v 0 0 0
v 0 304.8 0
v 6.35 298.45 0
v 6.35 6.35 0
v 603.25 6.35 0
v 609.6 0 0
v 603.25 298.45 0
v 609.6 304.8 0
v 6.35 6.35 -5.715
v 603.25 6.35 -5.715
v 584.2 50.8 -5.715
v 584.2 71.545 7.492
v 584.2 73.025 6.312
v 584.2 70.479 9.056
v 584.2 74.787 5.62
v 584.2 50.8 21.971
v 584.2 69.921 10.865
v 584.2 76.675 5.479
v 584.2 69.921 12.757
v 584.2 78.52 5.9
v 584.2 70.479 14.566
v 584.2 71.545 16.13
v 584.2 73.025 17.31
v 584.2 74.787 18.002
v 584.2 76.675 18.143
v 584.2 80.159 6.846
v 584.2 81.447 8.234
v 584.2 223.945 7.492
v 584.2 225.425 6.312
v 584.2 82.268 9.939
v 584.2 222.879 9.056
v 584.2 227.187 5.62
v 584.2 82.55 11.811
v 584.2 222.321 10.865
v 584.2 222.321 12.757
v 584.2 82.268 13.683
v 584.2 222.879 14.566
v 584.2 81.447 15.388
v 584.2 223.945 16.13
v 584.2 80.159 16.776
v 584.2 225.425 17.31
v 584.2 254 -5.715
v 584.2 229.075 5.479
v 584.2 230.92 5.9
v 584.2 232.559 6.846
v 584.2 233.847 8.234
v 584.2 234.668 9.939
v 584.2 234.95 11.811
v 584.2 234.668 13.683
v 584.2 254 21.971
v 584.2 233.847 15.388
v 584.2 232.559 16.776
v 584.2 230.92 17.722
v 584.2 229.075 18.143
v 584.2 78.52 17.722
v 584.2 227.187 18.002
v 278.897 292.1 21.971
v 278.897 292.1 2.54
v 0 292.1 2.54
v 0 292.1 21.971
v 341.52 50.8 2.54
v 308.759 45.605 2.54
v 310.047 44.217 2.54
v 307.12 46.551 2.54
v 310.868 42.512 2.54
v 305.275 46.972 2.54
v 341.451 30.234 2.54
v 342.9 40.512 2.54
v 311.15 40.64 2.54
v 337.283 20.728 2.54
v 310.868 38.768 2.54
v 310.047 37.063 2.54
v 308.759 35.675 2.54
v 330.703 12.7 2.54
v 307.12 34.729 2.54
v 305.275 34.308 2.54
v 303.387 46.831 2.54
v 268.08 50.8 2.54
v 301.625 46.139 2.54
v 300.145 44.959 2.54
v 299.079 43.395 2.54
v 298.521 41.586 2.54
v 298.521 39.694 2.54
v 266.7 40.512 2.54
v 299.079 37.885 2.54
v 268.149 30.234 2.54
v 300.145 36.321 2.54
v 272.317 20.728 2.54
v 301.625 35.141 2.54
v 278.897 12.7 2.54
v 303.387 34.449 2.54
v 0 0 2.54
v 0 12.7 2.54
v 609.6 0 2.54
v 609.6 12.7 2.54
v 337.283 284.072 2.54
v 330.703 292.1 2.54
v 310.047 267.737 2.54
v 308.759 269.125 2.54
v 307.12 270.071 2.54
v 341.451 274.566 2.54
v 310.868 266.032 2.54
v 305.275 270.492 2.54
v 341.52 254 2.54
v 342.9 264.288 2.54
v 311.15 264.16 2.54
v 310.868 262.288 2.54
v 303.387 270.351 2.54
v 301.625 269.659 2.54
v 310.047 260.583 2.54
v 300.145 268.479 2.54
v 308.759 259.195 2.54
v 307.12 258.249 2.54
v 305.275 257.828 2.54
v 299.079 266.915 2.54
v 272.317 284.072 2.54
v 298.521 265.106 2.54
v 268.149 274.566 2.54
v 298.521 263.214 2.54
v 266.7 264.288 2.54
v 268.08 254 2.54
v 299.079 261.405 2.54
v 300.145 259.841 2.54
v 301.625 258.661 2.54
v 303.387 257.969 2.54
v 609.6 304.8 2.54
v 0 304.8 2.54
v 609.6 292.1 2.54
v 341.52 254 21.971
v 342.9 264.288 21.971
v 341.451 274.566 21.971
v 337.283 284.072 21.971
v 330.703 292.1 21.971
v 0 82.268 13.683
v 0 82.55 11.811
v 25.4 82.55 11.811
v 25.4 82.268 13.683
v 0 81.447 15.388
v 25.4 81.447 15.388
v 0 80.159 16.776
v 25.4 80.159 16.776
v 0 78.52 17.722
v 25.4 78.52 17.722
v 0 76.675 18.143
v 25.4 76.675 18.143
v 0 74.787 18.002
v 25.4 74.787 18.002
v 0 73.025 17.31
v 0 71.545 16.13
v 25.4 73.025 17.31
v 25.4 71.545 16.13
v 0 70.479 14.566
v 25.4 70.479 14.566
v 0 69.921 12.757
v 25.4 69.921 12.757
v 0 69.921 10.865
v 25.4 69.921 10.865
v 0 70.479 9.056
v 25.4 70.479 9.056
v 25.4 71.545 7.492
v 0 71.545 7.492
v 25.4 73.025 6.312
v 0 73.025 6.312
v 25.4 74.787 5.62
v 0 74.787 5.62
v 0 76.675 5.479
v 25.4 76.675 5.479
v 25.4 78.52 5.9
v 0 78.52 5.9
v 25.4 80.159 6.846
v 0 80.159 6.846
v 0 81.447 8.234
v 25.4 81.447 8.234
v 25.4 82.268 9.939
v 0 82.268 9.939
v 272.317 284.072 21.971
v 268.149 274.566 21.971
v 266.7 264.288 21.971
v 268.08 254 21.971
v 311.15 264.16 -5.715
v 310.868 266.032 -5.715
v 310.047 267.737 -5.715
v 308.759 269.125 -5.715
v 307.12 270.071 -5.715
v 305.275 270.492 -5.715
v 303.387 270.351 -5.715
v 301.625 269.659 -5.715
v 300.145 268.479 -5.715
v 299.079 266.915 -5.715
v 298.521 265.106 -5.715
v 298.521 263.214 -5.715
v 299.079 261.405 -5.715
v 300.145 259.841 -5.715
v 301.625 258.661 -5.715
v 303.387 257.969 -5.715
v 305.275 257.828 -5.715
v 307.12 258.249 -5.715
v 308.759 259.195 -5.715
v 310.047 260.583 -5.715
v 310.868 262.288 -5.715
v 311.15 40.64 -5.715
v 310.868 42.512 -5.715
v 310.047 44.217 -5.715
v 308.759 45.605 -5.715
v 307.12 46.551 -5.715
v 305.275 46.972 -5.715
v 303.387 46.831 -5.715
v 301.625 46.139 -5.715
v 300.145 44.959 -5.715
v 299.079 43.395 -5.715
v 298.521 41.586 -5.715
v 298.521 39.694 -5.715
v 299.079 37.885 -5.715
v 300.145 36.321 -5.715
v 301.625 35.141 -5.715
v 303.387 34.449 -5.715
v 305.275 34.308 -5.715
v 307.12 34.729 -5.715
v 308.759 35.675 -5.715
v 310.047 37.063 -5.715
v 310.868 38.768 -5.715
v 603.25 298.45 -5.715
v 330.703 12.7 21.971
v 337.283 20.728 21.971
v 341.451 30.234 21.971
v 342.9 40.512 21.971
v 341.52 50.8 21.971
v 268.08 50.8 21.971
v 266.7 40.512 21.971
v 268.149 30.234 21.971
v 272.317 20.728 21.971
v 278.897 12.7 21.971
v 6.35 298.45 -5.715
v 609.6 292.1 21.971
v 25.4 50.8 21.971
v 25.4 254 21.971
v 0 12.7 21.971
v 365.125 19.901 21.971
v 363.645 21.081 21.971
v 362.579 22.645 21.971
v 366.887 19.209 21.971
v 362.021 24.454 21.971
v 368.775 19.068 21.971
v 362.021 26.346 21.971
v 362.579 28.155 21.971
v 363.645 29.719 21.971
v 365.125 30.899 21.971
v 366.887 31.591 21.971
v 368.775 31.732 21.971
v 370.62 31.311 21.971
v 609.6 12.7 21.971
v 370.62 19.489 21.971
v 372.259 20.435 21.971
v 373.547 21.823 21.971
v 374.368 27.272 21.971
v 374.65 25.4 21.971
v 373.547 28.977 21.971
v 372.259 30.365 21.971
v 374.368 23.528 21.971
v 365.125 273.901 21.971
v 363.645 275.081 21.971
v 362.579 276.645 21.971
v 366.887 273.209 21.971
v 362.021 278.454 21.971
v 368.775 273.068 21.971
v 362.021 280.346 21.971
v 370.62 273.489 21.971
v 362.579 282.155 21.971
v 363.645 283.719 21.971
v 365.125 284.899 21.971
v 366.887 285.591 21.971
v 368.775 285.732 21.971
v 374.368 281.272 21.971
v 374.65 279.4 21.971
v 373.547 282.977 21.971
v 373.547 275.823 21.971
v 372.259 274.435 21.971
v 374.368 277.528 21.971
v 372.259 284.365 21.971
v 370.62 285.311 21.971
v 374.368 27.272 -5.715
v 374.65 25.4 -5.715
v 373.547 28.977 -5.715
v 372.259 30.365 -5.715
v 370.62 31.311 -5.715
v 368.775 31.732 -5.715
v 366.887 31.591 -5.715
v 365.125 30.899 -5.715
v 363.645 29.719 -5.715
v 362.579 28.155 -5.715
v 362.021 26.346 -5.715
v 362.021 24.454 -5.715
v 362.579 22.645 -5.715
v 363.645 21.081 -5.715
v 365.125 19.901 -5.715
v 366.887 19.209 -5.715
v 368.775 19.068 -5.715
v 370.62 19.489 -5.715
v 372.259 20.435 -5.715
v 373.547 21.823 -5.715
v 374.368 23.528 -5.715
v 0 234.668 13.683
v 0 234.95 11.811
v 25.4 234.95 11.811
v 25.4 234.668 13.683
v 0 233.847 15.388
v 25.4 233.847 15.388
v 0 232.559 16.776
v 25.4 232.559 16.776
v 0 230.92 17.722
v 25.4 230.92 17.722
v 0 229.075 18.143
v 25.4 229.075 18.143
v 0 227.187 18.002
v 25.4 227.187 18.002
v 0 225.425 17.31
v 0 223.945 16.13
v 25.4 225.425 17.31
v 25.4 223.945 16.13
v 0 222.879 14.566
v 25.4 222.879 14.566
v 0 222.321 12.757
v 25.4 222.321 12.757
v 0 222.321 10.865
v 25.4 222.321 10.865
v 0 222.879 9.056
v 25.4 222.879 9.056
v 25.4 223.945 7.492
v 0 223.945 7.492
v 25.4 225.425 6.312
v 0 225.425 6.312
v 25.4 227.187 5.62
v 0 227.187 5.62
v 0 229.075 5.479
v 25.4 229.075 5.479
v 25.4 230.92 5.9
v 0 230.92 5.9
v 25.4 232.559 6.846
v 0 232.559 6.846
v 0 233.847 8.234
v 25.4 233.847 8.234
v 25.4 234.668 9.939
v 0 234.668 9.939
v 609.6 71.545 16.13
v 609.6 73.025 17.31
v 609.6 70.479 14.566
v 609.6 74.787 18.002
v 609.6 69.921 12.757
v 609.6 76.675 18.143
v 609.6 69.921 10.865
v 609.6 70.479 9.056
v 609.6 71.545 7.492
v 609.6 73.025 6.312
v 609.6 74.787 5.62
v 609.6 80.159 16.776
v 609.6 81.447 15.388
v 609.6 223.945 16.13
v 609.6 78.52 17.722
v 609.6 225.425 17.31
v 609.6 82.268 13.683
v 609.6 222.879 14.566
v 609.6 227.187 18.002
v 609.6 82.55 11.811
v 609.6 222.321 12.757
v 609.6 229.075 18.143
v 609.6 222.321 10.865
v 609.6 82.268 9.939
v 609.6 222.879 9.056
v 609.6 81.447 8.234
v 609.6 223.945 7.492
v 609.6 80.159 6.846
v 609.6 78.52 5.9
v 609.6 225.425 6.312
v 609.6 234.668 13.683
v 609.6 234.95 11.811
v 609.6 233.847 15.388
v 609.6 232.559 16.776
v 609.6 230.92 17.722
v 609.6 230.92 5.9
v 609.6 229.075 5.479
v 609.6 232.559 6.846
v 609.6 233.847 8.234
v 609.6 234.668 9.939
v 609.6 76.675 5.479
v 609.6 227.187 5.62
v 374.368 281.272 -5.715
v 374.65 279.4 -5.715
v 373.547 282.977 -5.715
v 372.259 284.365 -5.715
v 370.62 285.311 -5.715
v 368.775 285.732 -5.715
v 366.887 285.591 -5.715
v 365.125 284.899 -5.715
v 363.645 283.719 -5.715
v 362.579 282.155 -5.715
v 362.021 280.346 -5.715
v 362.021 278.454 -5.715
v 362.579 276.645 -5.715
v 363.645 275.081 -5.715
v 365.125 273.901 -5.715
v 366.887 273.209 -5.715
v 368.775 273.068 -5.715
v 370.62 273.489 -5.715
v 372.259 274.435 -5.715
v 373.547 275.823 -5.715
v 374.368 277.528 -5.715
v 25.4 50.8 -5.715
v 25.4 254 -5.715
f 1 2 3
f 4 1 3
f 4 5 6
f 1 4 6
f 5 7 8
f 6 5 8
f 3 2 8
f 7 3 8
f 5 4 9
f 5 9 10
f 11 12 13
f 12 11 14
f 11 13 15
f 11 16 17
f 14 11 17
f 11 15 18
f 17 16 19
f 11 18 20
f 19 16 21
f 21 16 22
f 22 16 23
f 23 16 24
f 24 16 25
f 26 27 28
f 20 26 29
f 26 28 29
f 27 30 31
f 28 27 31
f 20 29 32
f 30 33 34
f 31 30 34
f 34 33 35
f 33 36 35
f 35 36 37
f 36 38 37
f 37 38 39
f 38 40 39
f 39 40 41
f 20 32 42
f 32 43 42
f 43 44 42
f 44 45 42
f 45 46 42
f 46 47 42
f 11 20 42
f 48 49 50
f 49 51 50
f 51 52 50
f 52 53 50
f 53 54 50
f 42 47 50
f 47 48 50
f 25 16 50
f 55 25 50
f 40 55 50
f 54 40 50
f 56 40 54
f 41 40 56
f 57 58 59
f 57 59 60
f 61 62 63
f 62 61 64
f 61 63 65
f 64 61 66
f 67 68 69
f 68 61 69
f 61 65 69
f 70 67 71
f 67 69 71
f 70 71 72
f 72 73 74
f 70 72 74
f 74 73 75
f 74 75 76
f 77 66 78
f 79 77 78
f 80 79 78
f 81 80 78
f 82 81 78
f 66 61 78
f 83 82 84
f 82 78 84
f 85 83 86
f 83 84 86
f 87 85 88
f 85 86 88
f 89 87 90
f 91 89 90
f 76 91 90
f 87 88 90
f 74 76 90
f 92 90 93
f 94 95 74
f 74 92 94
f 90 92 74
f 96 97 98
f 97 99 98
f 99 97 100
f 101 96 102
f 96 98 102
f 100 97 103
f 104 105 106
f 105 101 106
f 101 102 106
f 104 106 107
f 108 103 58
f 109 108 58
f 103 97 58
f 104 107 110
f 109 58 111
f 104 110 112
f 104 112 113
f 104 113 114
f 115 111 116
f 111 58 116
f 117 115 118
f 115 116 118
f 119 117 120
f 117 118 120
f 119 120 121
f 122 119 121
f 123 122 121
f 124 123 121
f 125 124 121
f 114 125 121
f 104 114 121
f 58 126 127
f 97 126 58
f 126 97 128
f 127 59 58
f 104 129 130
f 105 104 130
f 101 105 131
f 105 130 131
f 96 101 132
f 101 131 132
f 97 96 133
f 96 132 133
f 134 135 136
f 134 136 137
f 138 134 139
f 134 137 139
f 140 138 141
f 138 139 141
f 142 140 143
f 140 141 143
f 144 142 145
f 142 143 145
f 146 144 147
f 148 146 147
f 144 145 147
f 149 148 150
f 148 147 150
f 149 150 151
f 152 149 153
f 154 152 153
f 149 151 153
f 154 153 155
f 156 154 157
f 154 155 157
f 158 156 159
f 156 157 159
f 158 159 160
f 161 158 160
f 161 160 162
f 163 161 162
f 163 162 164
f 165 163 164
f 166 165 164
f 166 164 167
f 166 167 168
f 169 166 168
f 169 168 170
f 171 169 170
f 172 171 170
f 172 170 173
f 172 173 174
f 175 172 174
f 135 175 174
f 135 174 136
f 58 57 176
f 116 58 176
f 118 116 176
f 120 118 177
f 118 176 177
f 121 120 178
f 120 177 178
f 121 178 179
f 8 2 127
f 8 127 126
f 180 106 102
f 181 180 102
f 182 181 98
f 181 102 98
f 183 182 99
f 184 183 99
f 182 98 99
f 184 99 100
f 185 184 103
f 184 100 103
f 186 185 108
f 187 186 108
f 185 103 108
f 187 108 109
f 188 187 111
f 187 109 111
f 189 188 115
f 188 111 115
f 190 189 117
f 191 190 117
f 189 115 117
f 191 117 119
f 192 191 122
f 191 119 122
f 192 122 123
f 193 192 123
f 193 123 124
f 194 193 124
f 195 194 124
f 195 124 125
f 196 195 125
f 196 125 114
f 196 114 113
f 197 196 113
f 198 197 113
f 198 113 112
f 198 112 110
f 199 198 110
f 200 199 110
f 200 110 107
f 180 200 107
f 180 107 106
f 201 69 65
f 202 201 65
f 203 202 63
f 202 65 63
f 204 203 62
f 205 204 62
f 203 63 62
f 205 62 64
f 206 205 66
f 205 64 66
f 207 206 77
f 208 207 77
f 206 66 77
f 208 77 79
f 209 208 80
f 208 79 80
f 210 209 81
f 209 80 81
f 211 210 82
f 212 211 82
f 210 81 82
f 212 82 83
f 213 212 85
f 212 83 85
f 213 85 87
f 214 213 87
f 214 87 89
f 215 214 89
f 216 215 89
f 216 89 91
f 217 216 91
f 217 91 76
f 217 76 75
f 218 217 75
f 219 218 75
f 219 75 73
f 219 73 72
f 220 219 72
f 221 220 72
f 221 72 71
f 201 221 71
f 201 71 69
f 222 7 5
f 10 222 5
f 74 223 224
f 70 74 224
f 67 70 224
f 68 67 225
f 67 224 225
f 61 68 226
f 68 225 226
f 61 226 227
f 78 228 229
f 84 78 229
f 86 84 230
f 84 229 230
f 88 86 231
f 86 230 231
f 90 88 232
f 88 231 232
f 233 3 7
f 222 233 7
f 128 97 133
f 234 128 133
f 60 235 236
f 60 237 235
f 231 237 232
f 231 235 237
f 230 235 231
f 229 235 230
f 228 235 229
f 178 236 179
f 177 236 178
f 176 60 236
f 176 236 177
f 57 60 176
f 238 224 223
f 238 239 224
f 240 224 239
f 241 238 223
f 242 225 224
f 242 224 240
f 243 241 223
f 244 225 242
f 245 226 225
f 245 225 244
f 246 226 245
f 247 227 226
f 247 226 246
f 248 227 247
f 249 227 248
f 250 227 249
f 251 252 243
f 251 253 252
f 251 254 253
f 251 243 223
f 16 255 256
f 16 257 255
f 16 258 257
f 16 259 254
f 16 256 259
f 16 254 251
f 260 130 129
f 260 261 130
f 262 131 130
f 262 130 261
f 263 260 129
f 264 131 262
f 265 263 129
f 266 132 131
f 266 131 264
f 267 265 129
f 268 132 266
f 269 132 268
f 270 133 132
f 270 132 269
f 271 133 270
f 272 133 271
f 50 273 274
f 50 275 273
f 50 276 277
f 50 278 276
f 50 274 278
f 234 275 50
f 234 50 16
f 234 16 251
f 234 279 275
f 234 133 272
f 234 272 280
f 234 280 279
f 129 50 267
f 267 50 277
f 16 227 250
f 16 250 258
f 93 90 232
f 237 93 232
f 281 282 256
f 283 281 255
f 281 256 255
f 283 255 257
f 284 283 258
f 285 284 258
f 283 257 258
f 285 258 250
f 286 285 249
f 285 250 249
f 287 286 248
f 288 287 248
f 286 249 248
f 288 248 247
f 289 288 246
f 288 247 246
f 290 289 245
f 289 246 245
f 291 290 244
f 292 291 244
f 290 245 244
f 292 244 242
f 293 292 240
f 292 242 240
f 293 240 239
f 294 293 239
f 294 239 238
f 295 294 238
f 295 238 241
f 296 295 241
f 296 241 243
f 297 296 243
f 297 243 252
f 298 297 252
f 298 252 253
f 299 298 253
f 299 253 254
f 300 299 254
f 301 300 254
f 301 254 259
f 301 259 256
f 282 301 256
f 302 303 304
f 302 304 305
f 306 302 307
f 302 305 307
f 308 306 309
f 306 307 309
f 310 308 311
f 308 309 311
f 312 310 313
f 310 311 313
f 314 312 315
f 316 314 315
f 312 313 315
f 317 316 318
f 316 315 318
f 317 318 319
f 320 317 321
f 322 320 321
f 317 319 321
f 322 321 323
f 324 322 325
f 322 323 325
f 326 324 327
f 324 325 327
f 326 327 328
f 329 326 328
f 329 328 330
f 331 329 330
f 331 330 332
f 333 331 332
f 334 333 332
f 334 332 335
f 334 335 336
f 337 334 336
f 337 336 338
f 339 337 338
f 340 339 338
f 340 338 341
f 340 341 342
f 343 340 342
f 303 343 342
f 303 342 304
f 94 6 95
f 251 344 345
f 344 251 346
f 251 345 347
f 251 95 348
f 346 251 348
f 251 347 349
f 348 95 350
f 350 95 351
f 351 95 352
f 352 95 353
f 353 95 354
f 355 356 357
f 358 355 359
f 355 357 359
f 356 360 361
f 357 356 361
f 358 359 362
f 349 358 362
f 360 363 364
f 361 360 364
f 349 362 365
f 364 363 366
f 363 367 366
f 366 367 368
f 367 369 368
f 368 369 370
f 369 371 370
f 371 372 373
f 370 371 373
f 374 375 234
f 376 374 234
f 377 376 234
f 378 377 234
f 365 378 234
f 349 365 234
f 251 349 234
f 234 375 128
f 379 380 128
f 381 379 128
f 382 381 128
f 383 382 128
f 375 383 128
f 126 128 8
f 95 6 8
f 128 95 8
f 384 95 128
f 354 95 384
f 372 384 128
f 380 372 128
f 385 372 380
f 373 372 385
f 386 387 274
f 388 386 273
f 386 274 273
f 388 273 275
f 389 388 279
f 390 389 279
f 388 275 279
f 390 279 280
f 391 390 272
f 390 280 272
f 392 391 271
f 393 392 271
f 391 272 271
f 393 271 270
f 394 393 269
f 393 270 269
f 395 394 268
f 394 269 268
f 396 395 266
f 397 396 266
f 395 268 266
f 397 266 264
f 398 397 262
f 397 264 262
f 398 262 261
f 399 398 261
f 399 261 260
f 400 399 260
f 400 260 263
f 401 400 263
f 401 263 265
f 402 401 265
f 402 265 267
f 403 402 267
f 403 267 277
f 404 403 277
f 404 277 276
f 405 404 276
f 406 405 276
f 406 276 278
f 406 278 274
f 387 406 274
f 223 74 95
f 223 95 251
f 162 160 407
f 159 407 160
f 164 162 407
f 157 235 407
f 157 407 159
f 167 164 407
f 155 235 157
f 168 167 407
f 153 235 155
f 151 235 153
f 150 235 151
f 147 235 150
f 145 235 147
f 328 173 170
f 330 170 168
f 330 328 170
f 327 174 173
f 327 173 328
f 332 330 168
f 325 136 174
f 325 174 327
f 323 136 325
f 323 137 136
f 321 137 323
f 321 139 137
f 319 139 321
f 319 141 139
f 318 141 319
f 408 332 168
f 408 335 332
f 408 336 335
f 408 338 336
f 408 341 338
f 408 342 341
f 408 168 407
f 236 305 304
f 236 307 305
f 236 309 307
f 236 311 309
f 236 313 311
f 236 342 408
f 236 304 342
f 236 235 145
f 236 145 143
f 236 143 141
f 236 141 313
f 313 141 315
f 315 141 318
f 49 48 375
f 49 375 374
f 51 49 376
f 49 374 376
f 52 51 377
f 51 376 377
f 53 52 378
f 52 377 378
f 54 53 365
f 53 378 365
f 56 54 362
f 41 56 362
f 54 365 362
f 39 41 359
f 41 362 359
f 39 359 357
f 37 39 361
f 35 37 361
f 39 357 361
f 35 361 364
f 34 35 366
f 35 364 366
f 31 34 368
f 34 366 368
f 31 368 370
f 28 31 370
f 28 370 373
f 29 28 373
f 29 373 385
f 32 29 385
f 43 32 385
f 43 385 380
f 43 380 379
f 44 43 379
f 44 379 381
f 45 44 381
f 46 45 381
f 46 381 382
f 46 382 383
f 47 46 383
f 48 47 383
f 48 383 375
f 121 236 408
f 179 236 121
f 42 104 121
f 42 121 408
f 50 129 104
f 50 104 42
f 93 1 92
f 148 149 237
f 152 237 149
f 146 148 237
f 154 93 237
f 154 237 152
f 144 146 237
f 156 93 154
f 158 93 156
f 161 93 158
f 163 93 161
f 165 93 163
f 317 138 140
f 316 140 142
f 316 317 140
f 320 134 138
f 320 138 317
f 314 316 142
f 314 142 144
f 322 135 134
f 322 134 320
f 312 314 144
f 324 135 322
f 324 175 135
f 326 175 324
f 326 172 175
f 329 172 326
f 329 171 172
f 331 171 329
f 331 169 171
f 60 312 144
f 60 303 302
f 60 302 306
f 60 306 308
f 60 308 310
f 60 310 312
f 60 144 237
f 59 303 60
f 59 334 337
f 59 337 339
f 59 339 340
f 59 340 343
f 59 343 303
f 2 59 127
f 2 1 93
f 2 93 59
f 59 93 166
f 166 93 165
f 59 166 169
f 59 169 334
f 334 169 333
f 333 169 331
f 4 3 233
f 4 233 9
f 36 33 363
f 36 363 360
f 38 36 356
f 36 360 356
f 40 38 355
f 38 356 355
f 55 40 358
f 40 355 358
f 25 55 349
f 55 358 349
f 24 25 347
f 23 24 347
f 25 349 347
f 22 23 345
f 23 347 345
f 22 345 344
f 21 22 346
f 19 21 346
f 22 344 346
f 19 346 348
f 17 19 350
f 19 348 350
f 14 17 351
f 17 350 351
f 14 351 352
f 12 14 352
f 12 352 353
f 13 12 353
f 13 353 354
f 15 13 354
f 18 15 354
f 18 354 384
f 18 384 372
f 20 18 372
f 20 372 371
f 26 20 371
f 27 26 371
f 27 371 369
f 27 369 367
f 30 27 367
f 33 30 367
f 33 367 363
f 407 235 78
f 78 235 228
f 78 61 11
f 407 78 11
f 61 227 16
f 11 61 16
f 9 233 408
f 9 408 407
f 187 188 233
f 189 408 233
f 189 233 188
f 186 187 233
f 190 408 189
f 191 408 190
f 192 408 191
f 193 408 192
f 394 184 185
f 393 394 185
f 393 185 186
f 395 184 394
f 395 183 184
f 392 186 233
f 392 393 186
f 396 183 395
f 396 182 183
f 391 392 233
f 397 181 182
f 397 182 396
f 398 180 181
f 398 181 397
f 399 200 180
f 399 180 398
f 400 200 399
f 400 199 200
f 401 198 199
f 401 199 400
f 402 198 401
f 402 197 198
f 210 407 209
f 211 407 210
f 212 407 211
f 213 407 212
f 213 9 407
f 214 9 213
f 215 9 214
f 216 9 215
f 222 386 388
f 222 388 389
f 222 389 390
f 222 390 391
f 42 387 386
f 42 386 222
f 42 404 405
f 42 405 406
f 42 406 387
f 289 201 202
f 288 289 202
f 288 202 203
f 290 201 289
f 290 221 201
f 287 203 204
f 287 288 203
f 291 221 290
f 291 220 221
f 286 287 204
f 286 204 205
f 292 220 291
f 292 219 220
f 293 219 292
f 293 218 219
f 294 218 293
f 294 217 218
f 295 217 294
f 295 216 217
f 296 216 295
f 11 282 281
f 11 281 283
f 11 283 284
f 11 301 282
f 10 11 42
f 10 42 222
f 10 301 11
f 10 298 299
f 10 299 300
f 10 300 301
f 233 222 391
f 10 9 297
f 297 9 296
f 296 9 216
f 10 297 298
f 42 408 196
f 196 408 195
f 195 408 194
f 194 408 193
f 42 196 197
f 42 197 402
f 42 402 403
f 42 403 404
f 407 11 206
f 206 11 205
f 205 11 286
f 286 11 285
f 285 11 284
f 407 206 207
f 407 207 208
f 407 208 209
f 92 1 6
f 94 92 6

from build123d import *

# Parameters (mm, degrees)
F0_W      = 609.6
F0_H      = 304.8
F1_DEPTH  = 21.971
F2_W      = 596.9
F2_H      = 292.1
F3_DEPTH  = 5.715
F5_W      = 558.8
F5_H      = 203.2
F6_DEPTH  = 27.687
F8_W      = 12.7
F8_H      = 19.431
F9_DEPTH  = 609.601
F10_R     = 38.1
F11_DEPTH = 19.431
F12_R     = 6.35
F13_DEPTH = 8.256
F14_R     = 6.35
F15_DEPTH = 609.601
F16_R     = 6.35
F17_DEPTH = 27.687


with BuildPart() as f1:
    # F0 (on Top) → F1 (new body)
    with BuildSketch(Plane.XY):
        with Locations((304.8, 152.4)):
            Rectangle(F0_W, F0_H)
    extrude(amount=F1_DEPTH)

    # F2 (on face) → F3 (join)
    with BuildSketch(Plane(origin=(0, 0, 0), x_dir=(1, 0, 0), z_dir=(0, 0, -1))):
        with Locations((304.8, -152.4)):
            Rectangle(F2_W, F2_H)
    extrude(amount=F3_DEPTH)

    # F5 (on face) → F6 (cut, through all)
    with BuildSketch(Plane.XY.offset(21.971)):
        with Locations((304.8, 152.4)):
            Rectangle(F5_W, F5_H)
    extrude(amount=-F6_DEPTH, mode=Mode.SUBTRACT)

    # F8 (on face) → F9 (cut, through all)
    with BuildSketch(Plane(origin=(0, 0, 0), x_dir=(0, -1, 0), z_dir=(-1, 0, 0))):
        with Locations((-298.45, 12.2555)):
            Rectangle(F8_W, F8_H)
        with Locations((-6.35, 12.2555)):
            Rectangle(F8_W, F8_H)
    extrude(amount=-F9_DEPTH, mode=Mode.SUBTRACT)

    # F10 (on face) → F11 (cut, through all)
    with BuildSketch(Plane.XY.offset(21.971)):
        with Locations((304.8, 40.64)):
            Circle(F10_R)
        with Locations((304.8, 264.16)):
            Circle(F10_R)
    extrude(amount=-F11_DEPTH, mode=Mode.SUBTRACT)

    # F12 (on face) → F13 (cut, through all)
    with BuildSketch(Plane.XY.offset(2.54)):
        with Locations((304.8, 264.16)):
            Circle(F12_R)
        with Locations((304.8, 40.64)):
            Circle(F12_R)
    extrude(amount=-F13_DEPTH, mode=Mode.SUBTRACT)

    # F14 (on face) → F15 (cut, through all)
    with BuildSketch(Plane.YZ.offset(609.6)):
        with Locations((228.6, 11.811)):
            Circle(F14_R)
        with Locations((76.2, 11.811)):
            Circle(F14_R)
    extrude(amount=-F15_DEPTH, mode=Mode.SUBTRACT)

    # F16 (on face) → F17 (cut, through all)
    with BuildSketch(Plane.XY.offset(21.971)):
        with Locations((368.3, 25.4)):
            Circle(F16_R)
        with Locations((368.3, 279.4)):
            Circle(F16_R)
    extrude(amount=-F17_DEPTH, mode=Mode.SUBTRACT)


solid = f1.part
